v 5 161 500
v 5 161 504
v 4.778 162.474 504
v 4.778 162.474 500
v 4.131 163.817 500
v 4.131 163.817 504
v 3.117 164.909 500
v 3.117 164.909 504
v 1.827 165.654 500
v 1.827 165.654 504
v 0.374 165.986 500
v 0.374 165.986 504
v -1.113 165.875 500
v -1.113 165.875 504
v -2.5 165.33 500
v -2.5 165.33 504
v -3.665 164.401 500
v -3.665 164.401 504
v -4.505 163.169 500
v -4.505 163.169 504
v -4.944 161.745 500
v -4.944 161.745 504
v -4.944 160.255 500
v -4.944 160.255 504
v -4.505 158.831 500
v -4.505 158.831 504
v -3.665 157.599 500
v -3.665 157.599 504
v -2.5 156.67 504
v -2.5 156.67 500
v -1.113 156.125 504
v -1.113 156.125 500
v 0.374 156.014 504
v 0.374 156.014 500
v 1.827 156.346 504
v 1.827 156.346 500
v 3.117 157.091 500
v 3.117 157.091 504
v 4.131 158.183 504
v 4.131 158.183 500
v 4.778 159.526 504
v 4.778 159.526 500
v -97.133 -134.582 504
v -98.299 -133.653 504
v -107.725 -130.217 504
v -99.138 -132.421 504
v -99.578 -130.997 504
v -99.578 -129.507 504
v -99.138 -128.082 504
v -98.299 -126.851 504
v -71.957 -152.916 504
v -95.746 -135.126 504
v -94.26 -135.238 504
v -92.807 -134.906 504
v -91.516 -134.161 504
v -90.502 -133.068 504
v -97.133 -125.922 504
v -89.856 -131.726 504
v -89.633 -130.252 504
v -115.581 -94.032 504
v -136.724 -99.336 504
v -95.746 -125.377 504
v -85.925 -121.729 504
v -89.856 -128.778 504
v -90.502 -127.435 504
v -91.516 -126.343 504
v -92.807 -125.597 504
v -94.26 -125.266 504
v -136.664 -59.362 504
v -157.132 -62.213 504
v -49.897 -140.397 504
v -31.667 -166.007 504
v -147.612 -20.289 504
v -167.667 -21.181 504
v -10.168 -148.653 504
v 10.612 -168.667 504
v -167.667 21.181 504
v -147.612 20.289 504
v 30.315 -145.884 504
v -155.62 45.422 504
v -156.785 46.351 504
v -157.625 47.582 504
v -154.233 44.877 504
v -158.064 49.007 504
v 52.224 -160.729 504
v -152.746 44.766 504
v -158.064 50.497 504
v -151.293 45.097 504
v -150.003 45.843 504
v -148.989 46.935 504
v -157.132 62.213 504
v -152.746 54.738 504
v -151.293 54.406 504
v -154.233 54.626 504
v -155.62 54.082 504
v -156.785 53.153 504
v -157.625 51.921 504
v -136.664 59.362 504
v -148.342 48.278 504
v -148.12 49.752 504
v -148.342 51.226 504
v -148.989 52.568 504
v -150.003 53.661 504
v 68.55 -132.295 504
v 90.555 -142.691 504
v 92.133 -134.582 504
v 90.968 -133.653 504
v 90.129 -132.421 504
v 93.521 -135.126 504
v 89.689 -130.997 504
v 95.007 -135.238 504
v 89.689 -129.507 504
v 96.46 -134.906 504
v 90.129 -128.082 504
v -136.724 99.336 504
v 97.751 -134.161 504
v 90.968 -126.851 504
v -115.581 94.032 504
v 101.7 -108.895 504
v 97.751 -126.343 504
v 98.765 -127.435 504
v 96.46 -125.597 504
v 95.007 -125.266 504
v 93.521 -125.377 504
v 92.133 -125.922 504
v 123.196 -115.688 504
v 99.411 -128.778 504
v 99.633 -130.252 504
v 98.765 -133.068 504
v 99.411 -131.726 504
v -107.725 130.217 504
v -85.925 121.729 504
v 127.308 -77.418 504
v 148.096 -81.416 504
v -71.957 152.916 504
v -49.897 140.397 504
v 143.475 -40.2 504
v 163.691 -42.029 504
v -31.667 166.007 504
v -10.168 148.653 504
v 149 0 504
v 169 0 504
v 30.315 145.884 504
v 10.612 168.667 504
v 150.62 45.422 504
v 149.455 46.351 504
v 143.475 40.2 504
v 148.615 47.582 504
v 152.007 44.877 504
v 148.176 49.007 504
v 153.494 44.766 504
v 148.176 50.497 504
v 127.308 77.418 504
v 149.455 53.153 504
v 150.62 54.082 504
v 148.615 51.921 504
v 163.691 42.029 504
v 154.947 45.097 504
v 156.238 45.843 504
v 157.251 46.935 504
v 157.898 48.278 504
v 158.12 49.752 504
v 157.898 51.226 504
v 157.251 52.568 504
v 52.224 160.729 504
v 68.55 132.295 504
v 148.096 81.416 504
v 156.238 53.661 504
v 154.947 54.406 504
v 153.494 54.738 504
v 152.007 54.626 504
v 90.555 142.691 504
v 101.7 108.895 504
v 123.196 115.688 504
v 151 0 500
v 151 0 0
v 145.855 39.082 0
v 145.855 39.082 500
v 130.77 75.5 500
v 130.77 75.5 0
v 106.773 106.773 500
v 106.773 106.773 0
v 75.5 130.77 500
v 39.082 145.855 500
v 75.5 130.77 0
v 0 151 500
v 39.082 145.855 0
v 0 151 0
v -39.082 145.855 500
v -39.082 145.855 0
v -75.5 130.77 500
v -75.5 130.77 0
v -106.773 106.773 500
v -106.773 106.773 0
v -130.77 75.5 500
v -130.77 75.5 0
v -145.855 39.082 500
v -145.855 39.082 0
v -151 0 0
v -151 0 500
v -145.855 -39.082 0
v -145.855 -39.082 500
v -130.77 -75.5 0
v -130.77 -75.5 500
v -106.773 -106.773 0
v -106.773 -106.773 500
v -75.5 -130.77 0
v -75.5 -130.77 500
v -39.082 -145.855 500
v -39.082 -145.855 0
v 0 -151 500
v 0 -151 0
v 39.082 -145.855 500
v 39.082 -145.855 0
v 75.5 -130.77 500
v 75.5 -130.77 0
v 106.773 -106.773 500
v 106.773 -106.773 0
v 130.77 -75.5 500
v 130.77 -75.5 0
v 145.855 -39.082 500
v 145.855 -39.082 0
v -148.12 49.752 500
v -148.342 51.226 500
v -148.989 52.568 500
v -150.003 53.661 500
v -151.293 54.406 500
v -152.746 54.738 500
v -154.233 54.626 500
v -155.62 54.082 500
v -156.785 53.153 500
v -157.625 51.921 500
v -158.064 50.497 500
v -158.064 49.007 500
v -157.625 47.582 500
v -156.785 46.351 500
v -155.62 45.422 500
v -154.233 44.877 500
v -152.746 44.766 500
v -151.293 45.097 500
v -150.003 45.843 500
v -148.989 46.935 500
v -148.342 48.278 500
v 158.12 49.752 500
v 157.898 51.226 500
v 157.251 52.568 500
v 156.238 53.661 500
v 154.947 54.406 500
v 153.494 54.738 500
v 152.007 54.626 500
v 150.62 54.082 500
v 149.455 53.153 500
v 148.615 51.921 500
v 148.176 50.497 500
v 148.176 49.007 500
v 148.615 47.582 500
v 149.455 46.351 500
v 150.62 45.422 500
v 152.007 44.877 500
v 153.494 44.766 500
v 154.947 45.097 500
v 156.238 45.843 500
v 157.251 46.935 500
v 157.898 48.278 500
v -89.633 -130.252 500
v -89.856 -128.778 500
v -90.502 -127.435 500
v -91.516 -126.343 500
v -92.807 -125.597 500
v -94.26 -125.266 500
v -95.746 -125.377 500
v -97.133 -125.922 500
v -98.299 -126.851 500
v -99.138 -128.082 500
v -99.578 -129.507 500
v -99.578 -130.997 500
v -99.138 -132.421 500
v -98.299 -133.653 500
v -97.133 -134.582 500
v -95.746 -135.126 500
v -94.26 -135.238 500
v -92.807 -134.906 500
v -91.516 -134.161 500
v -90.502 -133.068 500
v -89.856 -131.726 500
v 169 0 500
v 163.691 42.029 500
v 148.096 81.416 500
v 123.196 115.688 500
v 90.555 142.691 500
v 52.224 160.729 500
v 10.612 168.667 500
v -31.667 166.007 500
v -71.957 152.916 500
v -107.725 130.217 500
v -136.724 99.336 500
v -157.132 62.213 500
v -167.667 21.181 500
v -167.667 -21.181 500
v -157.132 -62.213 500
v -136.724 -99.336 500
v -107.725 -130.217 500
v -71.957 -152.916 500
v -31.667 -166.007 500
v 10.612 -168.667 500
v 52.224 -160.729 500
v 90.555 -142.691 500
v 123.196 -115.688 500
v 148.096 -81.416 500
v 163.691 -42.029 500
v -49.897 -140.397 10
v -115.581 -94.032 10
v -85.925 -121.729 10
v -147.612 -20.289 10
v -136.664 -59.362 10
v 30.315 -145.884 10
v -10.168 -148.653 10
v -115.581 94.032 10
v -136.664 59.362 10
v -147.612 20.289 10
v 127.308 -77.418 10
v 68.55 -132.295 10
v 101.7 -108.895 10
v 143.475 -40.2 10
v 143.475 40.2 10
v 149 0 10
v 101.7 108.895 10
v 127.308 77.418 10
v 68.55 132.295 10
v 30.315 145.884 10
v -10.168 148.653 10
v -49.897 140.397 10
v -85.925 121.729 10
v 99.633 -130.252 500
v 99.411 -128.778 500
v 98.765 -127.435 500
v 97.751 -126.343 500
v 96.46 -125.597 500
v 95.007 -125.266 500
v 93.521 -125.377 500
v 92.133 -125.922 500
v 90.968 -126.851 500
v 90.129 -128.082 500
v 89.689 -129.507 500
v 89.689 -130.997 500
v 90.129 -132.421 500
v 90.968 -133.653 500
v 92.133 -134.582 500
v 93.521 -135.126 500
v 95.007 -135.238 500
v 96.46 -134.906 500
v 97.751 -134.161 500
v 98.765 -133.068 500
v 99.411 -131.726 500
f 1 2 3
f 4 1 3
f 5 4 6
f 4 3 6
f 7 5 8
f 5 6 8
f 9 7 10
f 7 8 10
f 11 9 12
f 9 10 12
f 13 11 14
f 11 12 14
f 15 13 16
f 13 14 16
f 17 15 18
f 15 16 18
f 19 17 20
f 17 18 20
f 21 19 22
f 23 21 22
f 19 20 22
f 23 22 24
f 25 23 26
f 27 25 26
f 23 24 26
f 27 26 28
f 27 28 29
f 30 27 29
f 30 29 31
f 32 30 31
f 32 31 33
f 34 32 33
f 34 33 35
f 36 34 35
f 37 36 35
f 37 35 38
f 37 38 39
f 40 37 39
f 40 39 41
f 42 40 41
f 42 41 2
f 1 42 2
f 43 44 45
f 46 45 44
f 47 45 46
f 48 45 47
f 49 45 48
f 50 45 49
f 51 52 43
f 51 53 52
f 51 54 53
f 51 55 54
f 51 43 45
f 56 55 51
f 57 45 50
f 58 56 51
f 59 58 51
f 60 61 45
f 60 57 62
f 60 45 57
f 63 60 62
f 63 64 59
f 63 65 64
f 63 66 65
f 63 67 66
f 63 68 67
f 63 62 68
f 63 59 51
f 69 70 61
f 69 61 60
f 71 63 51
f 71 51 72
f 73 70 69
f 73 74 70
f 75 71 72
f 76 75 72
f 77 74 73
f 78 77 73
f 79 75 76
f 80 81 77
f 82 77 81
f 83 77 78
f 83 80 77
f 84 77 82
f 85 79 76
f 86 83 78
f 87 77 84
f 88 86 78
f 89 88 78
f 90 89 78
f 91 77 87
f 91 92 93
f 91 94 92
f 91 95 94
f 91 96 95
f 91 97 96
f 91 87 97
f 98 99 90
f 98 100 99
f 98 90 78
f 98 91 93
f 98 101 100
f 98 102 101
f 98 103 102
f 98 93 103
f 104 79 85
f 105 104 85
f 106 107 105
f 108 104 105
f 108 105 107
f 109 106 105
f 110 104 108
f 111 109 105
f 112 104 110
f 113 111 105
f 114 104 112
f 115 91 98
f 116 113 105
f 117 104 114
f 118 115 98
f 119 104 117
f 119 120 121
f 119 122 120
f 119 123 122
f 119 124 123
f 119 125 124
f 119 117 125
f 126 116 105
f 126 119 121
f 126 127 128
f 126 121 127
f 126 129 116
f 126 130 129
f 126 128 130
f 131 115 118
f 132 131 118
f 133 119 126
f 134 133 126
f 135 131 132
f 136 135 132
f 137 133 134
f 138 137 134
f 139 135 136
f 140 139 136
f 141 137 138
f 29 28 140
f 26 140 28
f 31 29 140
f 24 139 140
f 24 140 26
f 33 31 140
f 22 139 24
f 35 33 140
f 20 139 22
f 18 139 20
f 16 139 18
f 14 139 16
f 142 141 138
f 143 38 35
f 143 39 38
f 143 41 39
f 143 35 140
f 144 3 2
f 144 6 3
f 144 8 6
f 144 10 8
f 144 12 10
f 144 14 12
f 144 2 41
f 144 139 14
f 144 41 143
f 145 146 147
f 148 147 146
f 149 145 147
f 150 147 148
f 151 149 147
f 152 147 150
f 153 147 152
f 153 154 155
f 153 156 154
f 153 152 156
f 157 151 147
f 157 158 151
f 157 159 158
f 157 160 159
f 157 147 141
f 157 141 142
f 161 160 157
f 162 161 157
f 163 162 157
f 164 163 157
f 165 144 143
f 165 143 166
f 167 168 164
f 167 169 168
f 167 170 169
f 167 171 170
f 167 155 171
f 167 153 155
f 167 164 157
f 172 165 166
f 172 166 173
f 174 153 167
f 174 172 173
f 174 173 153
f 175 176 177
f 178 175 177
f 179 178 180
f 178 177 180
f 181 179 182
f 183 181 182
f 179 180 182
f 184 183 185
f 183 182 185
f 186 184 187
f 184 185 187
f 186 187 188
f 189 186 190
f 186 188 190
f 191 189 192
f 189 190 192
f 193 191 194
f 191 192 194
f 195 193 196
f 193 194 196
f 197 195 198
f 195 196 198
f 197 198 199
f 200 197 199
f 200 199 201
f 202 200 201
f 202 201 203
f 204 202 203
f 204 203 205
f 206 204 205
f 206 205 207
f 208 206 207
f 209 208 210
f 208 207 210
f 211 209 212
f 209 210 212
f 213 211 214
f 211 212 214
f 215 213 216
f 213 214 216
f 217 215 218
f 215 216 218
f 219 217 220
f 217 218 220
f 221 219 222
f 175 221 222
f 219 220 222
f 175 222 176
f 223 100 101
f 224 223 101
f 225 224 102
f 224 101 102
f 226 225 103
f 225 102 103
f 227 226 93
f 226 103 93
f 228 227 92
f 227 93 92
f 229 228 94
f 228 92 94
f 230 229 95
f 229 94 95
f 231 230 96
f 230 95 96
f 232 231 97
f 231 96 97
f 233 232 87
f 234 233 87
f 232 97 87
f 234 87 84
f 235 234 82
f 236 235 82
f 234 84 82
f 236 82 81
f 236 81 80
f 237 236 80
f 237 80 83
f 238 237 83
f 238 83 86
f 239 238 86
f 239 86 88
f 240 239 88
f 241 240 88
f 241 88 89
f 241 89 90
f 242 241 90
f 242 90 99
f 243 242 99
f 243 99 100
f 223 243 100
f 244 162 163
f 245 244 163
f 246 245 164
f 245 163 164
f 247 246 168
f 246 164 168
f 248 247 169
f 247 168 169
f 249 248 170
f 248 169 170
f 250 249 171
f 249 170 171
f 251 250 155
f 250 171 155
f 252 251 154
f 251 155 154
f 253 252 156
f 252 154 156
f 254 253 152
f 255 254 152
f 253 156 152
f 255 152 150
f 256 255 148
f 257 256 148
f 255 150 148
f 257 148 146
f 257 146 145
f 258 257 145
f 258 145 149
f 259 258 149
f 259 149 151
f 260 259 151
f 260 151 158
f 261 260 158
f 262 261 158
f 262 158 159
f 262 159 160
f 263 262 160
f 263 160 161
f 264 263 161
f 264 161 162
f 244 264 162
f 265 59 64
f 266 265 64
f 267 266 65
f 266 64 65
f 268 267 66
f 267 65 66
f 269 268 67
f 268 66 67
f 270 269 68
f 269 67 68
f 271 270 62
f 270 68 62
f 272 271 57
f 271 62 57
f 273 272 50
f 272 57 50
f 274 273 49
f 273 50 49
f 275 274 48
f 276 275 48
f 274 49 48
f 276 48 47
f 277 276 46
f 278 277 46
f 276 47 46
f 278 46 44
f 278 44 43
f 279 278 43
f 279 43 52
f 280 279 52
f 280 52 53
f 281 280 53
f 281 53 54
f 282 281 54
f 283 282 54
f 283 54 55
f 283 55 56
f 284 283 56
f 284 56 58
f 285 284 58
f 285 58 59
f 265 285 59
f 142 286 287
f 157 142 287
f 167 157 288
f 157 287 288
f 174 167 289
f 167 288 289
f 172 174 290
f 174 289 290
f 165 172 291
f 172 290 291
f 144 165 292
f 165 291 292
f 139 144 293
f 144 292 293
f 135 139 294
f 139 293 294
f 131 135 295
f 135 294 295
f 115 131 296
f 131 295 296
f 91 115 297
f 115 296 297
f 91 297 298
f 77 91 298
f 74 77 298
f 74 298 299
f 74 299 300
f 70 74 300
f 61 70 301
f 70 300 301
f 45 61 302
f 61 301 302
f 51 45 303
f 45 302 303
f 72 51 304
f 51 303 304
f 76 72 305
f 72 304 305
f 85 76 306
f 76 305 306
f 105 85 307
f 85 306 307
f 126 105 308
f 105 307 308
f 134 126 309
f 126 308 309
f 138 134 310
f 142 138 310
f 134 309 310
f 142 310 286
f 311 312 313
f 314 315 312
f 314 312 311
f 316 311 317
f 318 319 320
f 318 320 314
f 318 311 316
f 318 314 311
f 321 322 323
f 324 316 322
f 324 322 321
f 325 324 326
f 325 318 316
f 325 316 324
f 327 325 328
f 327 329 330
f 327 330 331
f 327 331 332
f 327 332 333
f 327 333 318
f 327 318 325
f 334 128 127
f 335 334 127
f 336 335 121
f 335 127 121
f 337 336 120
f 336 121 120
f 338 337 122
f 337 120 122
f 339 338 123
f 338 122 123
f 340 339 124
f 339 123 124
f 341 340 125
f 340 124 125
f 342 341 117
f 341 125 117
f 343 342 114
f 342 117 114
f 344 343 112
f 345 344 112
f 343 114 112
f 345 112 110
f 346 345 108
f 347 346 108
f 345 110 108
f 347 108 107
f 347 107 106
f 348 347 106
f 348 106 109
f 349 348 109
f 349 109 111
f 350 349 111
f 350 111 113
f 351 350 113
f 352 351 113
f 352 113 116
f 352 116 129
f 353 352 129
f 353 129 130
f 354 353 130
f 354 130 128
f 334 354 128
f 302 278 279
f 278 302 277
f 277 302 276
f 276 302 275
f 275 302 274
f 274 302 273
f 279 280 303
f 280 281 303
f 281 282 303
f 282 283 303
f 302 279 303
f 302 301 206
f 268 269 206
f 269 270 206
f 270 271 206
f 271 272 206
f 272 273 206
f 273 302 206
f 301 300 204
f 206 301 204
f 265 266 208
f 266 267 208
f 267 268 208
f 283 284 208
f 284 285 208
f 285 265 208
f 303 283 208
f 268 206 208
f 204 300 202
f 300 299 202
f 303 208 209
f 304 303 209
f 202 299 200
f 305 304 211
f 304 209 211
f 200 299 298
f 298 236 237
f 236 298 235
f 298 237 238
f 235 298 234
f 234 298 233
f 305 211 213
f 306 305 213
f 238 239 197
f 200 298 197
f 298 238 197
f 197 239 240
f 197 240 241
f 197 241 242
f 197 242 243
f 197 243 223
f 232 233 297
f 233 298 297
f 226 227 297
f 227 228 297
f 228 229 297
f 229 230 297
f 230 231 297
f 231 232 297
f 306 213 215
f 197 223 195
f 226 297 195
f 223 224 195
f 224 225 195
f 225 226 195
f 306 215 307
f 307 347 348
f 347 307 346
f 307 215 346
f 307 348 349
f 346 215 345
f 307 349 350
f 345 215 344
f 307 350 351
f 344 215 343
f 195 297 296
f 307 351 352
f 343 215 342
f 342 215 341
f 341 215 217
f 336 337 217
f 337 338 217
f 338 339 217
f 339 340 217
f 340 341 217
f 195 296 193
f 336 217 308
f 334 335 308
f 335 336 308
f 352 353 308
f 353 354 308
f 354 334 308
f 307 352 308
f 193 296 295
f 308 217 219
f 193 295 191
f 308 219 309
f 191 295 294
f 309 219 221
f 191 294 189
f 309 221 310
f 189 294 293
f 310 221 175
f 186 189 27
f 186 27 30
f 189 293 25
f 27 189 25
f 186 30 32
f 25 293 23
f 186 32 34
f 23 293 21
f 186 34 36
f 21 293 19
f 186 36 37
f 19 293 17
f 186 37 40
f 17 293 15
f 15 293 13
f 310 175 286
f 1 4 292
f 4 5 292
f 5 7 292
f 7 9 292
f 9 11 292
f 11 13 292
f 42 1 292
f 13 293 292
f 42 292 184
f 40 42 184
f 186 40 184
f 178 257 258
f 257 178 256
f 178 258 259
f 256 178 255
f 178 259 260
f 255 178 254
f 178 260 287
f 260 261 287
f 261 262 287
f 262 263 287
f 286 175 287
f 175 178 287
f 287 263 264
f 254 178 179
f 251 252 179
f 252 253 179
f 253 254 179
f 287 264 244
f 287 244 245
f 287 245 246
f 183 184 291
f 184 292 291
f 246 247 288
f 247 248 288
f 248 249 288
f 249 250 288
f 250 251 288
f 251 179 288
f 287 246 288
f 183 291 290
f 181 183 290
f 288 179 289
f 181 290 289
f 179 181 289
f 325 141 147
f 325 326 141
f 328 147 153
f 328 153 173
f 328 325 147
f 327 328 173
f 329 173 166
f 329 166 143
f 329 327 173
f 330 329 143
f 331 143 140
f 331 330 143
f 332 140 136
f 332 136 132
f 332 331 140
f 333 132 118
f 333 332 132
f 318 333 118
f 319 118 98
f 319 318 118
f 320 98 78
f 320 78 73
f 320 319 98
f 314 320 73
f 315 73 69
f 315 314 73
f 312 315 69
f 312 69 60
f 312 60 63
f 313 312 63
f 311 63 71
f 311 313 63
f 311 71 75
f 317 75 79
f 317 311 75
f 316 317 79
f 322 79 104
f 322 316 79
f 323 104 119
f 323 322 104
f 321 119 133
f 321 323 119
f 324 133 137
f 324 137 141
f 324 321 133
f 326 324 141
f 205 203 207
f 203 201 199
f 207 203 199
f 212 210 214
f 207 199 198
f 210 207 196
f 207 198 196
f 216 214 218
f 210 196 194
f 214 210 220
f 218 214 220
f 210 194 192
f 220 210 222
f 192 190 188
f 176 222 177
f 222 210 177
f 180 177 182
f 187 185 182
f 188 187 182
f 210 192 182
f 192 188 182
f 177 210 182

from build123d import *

# Parameters (mm, degrees)
F0_R     = 151
F1_DEPTH = 500
F2_R     = 149
F3_DEPTH = 490
F4_R     = 169
F4_R_2   = 149
F5_DEPTH = 4
F6_R     = 5
F7_DEPTH = 504.001


with BuildPart() as f1:
    # F0 (on Top) → F1 (new body)
    with BuildSketch(Plane.XY):
        Circle(F0_R)
    extrude(amount=F1_DEPTH)

    # F2 (on face) → F3 (cut)
    with BuildSketch(Plane.XY.offset(500)):
        Circle(F2_R)
    extrude(amount=-F3_DEPTH, mode=Mode.SUBTRACT)

    # F4 (on face) → F5 (join)
    with BuildSketch(Plane.XY.offset(500)):
        Circle(F4_R)
        Circle(F4_R_2, mode=Mode.SUBTRACT)
    extrude(amount=F5_DEPTH)

    # F6 (on face) → F7 (cut, through all)
    with BuildSketch(Plane.XY.offset(504)):
        with Locations((0, 161)):
            Circle(F6_R)
        with Locations((-153.120099, 49.751736)):
            Circle(F6_R)
        with Locations((-94.633426, -130.251736)):
            Circle(F6_R)
        with Locations((94.633426, -130.251736)):
            Circle(F6_R)
        with Locations((153.120099, 49.751736)):
            Circle(F6_R)
    extrude(amount=-F7_DEPTH, mode=Mode.SUBTRACT)


solid = f1.part
